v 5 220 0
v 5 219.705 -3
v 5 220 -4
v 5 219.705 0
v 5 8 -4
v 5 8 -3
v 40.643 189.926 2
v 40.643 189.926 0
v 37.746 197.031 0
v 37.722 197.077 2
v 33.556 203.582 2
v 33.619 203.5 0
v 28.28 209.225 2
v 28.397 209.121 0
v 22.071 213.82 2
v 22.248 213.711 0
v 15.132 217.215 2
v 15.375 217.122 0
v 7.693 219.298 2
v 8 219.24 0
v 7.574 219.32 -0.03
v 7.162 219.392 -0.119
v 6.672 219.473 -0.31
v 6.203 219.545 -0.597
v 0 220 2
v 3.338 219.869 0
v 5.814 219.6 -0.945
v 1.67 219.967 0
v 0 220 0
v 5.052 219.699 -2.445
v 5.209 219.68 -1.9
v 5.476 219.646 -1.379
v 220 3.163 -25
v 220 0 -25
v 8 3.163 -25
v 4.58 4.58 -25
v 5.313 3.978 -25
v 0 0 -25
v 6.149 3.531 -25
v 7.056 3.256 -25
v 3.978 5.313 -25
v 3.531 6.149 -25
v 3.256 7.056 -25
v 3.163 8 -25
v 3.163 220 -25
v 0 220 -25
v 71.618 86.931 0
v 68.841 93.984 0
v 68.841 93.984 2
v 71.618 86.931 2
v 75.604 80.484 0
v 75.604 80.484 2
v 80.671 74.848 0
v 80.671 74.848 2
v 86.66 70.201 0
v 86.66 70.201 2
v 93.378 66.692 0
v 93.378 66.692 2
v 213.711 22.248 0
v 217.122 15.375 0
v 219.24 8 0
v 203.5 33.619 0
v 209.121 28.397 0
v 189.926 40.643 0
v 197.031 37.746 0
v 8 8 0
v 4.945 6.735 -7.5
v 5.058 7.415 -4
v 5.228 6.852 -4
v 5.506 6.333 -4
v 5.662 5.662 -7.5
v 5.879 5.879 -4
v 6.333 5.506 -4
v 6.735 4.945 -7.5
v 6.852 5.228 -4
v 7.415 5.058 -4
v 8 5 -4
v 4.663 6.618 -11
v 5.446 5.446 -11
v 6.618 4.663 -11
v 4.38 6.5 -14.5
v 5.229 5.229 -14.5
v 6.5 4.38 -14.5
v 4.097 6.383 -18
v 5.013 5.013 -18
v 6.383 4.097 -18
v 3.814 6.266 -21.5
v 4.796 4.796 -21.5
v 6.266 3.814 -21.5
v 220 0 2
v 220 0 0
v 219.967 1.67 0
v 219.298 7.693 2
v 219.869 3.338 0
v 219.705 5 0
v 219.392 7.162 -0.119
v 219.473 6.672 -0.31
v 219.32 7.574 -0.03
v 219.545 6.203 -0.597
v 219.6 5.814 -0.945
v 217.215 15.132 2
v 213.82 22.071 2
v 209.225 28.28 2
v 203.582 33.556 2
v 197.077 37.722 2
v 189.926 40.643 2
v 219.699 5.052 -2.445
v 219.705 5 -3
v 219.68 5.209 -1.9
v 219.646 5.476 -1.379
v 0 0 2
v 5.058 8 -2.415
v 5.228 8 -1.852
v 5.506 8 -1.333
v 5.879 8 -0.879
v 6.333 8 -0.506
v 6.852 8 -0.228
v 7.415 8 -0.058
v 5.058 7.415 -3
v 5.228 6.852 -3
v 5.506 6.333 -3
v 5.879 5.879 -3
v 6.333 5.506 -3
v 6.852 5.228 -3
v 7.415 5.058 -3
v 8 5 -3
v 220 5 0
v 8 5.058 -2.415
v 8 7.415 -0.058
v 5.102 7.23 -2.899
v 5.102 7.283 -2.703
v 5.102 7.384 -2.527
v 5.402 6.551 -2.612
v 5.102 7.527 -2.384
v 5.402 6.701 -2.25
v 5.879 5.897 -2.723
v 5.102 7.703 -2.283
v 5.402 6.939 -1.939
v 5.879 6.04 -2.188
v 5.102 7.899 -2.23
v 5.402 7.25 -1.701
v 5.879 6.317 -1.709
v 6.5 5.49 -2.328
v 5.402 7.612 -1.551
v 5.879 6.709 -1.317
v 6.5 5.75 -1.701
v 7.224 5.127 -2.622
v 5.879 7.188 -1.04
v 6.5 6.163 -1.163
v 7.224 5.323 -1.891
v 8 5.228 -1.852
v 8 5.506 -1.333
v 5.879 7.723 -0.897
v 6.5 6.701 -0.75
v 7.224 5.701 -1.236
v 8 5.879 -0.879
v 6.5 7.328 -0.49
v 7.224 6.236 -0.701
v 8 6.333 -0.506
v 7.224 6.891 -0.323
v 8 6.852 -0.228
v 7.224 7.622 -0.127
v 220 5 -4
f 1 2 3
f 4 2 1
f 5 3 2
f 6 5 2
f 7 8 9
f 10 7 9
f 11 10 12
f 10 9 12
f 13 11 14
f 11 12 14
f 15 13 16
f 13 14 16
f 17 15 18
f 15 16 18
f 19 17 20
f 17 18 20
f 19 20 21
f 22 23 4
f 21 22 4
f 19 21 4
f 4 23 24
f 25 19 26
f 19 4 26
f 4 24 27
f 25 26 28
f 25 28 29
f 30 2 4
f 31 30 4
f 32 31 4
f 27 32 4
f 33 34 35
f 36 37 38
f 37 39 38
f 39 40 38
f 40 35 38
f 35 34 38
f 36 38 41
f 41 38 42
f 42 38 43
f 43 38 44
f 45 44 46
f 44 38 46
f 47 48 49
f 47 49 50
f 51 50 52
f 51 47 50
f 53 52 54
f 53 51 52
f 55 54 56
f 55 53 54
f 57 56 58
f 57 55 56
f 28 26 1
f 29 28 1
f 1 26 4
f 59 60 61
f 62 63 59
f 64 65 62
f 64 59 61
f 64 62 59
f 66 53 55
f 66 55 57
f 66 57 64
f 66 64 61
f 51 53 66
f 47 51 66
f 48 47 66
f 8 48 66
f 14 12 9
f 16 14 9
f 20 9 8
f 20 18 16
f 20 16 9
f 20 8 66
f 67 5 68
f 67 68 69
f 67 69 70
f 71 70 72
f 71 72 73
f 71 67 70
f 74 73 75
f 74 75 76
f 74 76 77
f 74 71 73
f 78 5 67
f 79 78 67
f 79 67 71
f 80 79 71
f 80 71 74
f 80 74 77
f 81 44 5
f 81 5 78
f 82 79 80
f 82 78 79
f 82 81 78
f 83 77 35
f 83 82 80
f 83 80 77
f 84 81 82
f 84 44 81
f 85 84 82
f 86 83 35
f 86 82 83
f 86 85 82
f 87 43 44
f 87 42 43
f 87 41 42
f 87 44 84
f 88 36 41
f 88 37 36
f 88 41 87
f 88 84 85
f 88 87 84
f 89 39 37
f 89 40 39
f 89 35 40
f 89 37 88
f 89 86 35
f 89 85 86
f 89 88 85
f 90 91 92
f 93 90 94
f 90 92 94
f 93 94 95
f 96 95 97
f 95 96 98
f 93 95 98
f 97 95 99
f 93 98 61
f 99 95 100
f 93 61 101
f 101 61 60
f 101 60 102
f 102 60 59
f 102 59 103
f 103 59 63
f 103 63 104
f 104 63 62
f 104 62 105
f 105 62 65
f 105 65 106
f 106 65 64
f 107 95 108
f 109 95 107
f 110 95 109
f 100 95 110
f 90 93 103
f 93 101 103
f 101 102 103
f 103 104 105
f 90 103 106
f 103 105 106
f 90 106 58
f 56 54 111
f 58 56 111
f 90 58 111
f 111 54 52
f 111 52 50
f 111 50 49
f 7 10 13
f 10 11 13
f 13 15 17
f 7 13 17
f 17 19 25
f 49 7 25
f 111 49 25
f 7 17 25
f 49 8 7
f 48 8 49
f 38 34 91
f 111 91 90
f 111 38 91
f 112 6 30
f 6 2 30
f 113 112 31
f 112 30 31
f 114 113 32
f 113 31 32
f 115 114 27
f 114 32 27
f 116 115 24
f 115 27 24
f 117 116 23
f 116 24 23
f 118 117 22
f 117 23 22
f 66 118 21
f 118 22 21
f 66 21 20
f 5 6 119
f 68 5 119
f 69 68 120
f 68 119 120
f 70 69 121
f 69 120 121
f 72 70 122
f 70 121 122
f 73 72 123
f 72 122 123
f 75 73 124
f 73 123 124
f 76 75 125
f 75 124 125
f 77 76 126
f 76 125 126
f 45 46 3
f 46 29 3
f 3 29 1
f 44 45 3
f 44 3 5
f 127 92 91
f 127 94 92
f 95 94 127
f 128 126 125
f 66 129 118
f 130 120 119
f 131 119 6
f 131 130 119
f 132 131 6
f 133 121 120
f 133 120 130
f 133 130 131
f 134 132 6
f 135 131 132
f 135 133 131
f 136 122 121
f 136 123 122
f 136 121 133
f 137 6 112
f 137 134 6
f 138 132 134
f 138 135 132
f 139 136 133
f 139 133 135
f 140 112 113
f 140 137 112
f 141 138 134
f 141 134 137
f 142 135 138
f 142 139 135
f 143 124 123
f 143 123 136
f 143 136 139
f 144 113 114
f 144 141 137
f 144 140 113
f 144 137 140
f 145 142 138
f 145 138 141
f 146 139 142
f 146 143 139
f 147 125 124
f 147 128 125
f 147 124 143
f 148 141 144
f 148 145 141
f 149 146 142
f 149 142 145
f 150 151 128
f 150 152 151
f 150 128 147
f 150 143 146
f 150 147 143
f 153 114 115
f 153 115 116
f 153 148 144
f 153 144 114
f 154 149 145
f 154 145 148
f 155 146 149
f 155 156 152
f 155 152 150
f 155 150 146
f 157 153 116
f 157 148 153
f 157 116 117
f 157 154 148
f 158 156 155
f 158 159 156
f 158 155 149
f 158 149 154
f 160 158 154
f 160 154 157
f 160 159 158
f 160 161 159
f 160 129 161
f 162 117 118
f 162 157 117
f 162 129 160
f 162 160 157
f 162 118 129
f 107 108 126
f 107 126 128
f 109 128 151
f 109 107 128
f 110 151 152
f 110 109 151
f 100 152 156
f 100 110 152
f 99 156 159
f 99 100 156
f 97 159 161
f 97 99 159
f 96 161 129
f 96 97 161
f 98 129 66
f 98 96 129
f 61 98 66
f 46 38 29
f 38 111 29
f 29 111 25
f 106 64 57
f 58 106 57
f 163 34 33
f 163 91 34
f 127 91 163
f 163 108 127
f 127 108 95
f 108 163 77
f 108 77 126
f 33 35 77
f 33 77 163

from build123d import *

# Parameters (mm, degrees)
PAD_DEPTH     = 2
SKETCH001_W   = 5
SKETCH001_H   = 25
PAD001_DEPTH  = 220
SKETCH002_W   = 5
SKETCH002_H   = 25
PAD002_DEPTH  = 220
FILLET_R      = 3
FILLET001_R   = 3
CHAMFER_ANGLE = 5
CHAMFER_SIZE  = 21


with BuildPart() as part:
    # Sketch → Pad (new body)
    with BuildSketch(Plane.XY):
        with BuildLine():
            Line((0, 0), (0, 220))
            ThreePointArc((40.642952, 189.925797), (25.279968, 211.663917), (0, 220))
            Line((40.642952, 189.925797), (68.840599, 93.983665))
            ThreePointArc((68.840599, 93.983665), (78.011612, 77.552663), (93.378142, 66.69195))
            Line((189.925797, 40.642952), (93.378142, 66.69195))
            ThreePointArc((220, 0), (211.663917, 25.279968), (189.925797, 40.642952))
            Line((220, 0), (0, 0))
        make_face()
    extrude(amount=PAD_DEPTH)

    # Sketch001 → Pad001 (join)
    with BuildSketch(Plane.YZ):
        with Locations((2.5, -12.5)):
            Rectangle(SKETCH001_W, SKETCH001_H)
    extrude(amount=PAD001_DEPTH)

    # Sketch002 → Pad002 (join)
    with BuildSketch(Plane.XZ):
        with Locations((2.5, -12.5)):
            Rectangle(SKETCH002_W, SKETCH002_H)
    extrude(amount=-PAD002_DEPTH)

    # Fillet
    fillet_edges = [part.edges().sort_by_distance(p)[0] for p in [
        (112.352429, 5, 0),
    ]]
    fillet(fillet_edges, radius=FILLET_R)

    # Fillet001
    fillet001_edges = [part.edges().sort_by_distance(p)[0] for p in [
        (5, 113.852429, 0),
        (5, 5, -14),
    ]]
    fillet(fillet001_edges, radius=FILLET001_R)

    # Chamfer
    chamfer_edges = [part.edges().sort_by_distance(p)[0] for p in [
        (114, 5, -25),
    ]]
    chamfer_side = part.faces().sort_by_distance((114.020092, 5, -13.997627))[0]
    chamfer(chamfer_edges, length=CHAMFER_SIZE, angle=CHAMFER_ANGLE, reference=chamfer_side)


solid = part.part
